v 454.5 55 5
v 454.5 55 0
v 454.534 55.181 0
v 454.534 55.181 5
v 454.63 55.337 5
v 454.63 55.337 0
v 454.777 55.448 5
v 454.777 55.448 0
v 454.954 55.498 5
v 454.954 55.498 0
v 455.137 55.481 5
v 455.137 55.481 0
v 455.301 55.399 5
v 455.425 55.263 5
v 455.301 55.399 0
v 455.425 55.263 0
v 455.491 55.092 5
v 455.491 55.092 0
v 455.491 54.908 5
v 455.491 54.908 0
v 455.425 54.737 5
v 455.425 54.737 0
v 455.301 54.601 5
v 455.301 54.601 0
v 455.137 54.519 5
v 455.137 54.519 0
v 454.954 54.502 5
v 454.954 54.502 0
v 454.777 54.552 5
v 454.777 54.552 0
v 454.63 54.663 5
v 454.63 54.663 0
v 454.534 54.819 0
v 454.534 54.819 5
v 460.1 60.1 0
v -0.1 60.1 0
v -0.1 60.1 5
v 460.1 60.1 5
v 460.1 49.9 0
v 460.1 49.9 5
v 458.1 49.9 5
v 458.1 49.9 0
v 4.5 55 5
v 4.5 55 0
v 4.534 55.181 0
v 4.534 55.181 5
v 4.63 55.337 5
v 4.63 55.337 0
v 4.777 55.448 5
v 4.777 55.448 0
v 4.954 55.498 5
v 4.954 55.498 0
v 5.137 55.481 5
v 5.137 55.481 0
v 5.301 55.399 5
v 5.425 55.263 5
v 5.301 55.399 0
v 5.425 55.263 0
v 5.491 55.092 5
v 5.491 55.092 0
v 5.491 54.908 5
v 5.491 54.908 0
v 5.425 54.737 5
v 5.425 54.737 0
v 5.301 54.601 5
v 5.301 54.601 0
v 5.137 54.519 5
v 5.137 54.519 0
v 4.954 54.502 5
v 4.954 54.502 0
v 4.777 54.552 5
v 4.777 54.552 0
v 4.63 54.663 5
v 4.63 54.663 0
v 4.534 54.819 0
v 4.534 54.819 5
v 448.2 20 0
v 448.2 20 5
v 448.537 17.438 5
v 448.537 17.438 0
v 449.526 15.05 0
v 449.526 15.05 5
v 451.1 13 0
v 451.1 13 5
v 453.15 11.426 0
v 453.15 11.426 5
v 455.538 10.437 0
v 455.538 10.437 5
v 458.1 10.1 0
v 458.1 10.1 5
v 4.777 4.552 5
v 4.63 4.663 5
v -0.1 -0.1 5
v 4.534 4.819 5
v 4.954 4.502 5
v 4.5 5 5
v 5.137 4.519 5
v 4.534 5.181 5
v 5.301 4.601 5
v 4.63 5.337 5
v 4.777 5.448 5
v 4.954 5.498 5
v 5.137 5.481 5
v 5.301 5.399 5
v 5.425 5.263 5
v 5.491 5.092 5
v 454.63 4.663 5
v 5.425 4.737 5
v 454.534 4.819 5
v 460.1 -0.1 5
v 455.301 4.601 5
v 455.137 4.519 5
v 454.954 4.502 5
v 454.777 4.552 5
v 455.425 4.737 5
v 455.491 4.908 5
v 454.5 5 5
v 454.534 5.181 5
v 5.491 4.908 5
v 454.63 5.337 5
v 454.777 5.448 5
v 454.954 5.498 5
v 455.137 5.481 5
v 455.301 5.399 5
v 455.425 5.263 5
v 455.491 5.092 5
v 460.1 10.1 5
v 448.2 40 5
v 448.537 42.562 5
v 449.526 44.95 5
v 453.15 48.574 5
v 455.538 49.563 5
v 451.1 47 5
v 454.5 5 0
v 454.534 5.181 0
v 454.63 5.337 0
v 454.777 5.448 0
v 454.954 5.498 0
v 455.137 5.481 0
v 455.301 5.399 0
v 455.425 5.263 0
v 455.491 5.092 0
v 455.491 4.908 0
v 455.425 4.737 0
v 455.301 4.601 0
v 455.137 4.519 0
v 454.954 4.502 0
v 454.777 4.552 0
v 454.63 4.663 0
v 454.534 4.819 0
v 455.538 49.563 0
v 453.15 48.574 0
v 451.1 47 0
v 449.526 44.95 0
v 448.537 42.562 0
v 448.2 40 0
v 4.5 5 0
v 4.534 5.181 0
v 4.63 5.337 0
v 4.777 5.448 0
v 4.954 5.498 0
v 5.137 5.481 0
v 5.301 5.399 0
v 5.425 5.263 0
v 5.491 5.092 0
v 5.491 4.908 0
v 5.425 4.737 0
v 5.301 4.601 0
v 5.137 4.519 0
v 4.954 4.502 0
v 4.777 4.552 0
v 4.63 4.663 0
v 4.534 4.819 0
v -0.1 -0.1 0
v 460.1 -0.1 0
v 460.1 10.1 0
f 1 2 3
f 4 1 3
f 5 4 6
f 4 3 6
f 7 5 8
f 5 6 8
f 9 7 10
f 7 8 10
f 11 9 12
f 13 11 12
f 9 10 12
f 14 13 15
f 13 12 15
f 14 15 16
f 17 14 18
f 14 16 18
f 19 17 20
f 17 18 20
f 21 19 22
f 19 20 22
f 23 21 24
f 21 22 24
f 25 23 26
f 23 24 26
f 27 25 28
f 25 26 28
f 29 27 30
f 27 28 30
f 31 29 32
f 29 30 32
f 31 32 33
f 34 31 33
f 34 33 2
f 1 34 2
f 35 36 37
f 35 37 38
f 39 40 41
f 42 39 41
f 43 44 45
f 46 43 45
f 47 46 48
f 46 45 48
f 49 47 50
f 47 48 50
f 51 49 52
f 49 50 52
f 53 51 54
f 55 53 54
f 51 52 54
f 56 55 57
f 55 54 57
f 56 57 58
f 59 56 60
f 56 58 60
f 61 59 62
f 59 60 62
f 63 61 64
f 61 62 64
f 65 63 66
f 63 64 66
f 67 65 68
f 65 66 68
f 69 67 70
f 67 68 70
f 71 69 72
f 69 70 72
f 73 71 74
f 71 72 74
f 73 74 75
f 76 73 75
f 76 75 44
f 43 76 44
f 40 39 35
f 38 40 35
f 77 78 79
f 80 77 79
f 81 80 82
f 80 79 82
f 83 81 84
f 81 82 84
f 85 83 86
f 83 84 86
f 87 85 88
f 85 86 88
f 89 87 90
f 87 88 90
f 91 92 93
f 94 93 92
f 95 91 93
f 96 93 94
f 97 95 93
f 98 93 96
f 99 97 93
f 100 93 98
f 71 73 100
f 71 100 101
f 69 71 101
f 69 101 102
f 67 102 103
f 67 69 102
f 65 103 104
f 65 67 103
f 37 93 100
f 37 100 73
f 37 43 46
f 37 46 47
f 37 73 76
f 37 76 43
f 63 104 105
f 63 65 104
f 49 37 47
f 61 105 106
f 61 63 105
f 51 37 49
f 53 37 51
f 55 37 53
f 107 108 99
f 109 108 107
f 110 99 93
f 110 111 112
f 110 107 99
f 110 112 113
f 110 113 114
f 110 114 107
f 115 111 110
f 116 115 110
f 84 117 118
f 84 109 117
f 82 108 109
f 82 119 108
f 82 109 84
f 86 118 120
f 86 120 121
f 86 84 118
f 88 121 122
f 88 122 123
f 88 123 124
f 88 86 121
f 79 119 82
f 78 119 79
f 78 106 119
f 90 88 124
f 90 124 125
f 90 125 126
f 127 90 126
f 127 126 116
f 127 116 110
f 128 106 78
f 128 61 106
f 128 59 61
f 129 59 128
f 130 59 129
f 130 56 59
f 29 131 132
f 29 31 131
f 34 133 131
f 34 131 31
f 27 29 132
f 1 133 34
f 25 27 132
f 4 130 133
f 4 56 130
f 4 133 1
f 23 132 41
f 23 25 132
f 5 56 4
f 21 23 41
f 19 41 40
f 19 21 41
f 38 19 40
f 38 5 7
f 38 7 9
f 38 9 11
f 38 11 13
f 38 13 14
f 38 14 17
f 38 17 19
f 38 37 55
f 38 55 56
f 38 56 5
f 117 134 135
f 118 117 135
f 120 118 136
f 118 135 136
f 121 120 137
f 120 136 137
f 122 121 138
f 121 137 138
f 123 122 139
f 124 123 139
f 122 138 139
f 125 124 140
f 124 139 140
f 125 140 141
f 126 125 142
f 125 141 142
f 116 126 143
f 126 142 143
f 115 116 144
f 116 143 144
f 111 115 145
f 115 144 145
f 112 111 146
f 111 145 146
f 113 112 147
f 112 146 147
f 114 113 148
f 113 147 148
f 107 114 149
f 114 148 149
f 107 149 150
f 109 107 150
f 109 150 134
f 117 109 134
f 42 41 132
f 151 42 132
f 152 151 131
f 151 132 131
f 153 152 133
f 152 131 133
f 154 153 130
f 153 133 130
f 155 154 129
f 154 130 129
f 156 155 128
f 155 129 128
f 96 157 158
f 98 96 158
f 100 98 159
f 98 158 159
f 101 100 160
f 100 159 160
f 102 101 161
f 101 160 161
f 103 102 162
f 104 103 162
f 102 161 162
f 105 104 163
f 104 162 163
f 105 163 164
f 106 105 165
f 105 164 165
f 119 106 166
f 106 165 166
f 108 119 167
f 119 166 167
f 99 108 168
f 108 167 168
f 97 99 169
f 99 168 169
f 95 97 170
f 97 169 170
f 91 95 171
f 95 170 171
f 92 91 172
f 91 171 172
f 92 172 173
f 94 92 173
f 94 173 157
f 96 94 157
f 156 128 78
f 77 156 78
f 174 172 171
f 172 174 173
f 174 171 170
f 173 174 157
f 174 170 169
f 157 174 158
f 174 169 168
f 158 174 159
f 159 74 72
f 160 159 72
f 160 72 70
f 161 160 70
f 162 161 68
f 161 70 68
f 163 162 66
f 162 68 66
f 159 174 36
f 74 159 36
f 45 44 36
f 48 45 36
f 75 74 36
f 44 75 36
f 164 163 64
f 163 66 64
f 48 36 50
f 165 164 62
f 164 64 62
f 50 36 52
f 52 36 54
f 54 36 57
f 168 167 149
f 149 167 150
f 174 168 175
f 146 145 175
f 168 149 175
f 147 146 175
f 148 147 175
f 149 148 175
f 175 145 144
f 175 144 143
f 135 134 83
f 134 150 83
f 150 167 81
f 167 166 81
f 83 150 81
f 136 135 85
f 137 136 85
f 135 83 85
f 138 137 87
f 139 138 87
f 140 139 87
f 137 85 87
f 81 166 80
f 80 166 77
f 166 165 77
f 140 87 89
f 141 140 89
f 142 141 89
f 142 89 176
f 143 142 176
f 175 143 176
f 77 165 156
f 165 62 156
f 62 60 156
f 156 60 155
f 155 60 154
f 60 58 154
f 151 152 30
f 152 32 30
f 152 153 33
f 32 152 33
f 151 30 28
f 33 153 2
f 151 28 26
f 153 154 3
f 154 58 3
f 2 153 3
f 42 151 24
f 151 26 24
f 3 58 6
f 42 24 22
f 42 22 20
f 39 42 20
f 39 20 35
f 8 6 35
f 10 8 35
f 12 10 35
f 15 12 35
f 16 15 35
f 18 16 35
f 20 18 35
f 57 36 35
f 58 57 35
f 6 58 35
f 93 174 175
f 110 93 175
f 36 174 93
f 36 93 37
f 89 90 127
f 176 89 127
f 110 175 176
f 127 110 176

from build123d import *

# Parameters (mm, degrees)
ESQUISSE1_W                   = 460.2
ESQUISSE1_H                   = 60.2
BOSS_EXTRU_1_DEPTH            = 5
DIAM_TRE_DU_PER_AGE_1_0_1_1_D = 1
ENL_V_MAT_EXTRU_1_REACH       = 7


with BuildPart() as part:
    # Esquisse1 → Boss.-Extru.1 (new body)
    with BuildSketch(Plane.XY):
        with Locations((230, 30)):
            Rectangle(ESQUISSE1_W, ESQUISSE1_H)
    extrude(amount=BOSS_EXTRU_1_DEPTH)

    # Diamètre du perçage Ø1.0 (1)1 (through all)
    with Locations(Plane.XY.offset(5)):
        with Locations((5, 55), (5, 5), (455, 5), (455, 55)):
            Hole(DIAM_TRE_DU_PER_AGE_1_0_1_1_D / 2)

    # Esquisse4 → Enlèv. mat.-Extru.1 (cut, up to next)
    with BuildSketch(Plane.XY.offset(5), mode=Mode.PRIVATE) as enl_v_mat_extru_1_sk1:
        with BuildLine():
            Line((460.1, 10.1), (460.1, 49.9))
            Line((460.1, 49.9), (458.1, 49.9))
            ThreePointArc((458.1, 49.9), (451.099642866, 47.000357134), (448.2, 40))
            Line((448.2, 40), (448.2, 20))
            ThreePointArc((448.2, 20), (451.099642866, 12.999642866), (458.1, 10.1))
            Line((458.1, 10.1), (460.1, 10.1))
        make_face()
    enl_v_mat_extru_1_tool1 = extrude(enl_v_mat_extru_1_sk1.sketch, amount=-ENL_V_MAT_EXTRU_1_REACH, mode=Mode.PRIVATE) & part.part
    add(enl_v_mat_extru_1_tool1.solids().sort_by_distance((454.51443, 30, 5))[0], mode=Mode.SUBTRACT)


solid = part.part
